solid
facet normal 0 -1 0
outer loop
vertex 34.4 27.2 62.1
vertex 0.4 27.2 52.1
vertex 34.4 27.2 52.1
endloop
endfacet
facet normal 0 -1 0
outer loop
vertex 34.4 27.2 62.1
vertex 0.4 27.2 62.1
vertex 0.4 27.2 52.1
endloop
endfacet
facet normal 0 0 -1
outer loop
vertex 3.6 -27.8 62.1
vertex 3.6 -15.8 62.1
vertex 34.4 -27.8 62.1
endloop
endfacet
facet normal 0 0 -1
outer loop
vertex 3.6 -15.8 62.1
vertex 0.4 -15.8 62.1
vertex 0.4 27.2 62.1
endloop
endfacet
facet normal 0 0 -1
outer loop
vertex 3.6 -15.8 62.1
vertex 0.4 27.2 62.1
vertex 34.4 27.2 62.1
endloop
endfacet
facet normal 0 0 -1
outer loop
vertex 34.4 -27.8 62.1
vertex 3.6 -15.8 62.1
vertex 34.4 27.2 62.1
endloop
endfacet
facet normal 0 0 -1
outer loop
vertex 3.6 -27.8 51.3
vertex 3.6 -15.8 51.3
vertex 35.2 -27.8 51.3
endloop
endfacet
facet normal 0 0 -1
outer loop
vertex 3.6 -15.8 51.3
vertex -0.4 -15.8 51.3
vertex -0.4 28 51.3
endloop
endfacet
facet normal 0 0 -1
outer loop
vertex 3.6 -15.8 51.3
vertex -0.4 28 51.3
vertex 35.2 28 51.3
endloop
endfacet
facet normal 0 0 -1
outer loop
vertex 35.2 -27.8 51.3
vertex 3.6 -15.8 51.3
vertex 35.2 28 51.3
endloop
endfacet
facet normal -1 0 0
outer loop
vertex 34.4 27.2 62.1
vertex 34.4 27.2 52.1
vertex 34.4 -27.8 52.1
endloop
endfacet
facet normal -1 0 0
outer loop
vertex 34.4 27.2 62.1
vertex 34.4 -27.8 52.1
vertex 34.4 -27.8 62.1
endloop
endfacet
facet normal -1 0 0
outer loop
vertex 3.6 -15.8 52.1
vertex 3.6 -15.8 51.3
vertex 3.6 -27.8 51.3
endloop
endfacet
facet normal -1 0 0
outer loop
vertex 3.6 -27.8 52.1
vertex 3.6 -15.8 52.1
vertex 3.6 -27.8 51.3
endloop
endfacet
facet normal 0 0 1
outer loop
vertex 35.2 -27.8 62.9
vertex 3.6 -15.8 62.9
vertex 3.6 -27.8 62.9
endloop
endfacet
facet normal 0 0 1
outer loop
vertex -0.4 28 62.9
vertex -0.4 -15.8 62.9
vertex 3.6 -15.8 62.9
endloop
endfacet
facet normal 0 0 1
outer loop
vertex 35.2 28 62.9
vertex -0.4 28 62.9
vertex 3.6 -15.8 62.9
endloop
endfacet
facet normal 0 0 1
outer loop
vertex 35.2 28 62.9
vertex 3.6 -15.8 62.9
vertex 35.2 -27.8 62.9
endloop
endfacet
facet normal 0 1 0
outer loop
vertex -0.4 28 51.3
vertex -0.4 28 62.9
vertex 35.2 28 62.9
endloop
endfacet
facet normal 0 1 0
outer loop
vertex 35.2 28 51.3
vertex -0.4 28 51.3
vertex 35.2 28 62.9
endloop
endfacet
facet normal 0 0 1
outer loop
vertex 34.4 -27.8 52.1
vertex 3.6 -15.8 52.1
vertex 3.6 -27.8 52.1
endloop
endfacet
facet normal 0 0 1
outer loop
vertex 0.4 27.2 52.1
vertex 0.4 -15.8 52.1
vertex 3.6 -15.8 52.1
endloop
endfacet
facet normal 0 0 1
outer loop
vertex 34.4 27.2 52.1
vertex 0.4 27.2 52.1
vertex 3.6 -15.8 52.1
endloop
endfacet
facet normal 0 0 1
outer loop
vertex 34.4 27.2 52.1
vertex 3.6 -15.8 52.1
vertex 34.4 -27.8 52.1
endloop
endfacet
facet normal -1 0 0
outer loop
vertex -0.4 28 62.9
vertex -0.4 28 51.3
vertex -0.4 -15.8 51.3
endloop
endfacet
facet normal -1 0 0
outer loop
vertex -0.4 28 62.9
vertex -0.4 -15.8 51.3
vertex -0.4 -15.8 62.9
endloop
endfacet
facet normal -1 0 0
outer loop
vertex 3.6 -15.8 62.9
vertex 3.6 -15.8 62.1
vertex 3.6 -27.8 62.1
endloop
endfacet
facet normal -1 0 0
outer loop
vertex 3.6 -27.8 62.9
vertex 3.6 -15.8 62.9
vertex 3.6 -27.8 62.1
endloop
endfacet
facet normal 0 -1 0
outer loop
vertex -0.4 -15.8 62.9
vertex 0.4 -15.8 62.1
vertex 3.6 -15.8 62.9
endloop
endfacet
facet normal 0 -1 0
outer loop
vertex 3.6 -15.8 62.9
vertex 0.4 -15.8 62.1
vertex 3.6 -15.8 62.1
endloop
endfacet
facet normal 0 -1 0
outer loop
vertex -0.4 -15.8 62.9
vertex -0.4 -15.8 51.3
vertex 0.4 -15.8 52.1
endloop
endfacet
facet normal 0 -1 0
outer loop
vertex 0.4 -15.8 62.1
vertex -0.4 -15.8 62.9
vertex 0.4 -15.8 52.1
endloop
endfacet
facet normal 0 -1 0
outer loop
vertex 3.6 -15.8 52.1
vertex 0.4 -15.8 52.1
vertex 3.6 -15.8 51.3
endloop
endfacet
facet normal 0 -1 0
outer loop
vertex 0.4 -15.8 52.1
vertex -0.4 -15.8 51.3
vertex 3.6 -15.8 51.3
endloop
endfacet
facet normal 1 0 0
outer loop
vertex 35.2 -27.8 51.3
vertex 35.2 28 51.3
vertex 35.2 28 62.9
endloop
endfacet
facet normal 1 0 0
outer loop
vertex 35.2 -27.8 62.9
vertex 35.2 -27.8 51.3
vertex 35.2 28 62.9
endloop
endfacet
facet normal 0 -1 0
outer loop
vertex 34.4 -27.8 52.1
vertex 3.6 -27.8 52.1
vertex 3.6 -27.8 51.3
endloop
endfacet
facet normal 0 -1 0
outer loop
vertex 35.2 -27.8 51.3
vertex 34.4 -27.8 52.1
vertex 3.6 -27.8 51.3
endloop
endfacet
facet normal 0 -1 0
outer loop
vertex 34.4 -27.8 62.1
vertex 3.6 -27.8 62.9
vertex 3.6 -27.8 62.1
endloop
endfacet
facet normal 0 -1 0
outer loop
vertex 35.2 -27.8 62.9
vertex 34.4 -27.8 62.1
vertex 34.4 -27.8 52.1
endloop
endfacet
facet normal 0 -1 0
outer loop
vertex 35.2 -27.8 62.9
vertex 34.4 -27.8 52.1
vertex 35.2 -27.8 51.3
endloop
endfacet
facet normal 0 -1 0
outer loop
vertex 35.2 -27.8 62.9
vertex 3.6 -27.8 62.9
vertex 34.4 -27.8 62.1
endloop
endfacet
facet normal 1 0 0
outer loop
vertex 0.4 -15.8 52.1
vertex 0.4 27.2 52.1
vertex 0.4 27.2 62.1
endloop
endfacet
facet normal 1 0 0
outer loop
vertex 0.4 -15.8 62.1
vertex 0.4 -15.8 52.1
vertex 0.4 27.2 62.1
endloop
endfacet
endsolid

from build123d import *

# Parameters (mm, degrees)
SKETCH004_W             = 35.6
SKETCH004_H             = 11.6
PAD003_DEPTH            = 0.8
SKETCH005_W             = 35.6
SKETCH005_H             = 11.6
SKETCH005_W_2           = 34
SKETCH005_H_2           = 10
PAD004_DEPTH            = 55.8
SKETCH006_W             = 4
SKETCH006_H             = 12
POCKET001_DEPTH         = 5.8
BODY002_PLACEMENT_ANGLE = 90


with BuildPart() as part:
    # Sketch004 → Pad003 (new body)
    with BuildSketch(Plane.XY):
        Rectangle(SKETCH004_W, SKETCH004_H)
    extrude(amount=PAD003_DEPTH)

    # Sketch005 → Pad004 (join)
    with BuildSketch(Plane.XY):
        Rectangle(SKETCH005_W, SKETCH005_H)
        Rectangle(SKETCH005_W_2, SKETCH005_H_2, mode=Mode.SUBTRACT)
    extrude(amount=PAD004_DEPTH)

    # Sketch006 → Pocket001 (cut, symmetric)
    with BuildSketch(Plane.XZ):
        with Locations((-15.8, 49.8)):
            Rectangle(SKETCH006_W, SKETCH006_H)
    extrude(amount=POCKET001_DEPTH, both=True, mode=Mode.SUBTRACT)


with BuildPart() as part_1:
    # Body002 placement: moved
    add(part.part.moved(Location((17.4, 28, 57.1))).rotate(Axis((17.4, 28, 57.1), (1, 0, 0)), BODY002_PLACEMENT_ANGLE))


solid = part_1.part
